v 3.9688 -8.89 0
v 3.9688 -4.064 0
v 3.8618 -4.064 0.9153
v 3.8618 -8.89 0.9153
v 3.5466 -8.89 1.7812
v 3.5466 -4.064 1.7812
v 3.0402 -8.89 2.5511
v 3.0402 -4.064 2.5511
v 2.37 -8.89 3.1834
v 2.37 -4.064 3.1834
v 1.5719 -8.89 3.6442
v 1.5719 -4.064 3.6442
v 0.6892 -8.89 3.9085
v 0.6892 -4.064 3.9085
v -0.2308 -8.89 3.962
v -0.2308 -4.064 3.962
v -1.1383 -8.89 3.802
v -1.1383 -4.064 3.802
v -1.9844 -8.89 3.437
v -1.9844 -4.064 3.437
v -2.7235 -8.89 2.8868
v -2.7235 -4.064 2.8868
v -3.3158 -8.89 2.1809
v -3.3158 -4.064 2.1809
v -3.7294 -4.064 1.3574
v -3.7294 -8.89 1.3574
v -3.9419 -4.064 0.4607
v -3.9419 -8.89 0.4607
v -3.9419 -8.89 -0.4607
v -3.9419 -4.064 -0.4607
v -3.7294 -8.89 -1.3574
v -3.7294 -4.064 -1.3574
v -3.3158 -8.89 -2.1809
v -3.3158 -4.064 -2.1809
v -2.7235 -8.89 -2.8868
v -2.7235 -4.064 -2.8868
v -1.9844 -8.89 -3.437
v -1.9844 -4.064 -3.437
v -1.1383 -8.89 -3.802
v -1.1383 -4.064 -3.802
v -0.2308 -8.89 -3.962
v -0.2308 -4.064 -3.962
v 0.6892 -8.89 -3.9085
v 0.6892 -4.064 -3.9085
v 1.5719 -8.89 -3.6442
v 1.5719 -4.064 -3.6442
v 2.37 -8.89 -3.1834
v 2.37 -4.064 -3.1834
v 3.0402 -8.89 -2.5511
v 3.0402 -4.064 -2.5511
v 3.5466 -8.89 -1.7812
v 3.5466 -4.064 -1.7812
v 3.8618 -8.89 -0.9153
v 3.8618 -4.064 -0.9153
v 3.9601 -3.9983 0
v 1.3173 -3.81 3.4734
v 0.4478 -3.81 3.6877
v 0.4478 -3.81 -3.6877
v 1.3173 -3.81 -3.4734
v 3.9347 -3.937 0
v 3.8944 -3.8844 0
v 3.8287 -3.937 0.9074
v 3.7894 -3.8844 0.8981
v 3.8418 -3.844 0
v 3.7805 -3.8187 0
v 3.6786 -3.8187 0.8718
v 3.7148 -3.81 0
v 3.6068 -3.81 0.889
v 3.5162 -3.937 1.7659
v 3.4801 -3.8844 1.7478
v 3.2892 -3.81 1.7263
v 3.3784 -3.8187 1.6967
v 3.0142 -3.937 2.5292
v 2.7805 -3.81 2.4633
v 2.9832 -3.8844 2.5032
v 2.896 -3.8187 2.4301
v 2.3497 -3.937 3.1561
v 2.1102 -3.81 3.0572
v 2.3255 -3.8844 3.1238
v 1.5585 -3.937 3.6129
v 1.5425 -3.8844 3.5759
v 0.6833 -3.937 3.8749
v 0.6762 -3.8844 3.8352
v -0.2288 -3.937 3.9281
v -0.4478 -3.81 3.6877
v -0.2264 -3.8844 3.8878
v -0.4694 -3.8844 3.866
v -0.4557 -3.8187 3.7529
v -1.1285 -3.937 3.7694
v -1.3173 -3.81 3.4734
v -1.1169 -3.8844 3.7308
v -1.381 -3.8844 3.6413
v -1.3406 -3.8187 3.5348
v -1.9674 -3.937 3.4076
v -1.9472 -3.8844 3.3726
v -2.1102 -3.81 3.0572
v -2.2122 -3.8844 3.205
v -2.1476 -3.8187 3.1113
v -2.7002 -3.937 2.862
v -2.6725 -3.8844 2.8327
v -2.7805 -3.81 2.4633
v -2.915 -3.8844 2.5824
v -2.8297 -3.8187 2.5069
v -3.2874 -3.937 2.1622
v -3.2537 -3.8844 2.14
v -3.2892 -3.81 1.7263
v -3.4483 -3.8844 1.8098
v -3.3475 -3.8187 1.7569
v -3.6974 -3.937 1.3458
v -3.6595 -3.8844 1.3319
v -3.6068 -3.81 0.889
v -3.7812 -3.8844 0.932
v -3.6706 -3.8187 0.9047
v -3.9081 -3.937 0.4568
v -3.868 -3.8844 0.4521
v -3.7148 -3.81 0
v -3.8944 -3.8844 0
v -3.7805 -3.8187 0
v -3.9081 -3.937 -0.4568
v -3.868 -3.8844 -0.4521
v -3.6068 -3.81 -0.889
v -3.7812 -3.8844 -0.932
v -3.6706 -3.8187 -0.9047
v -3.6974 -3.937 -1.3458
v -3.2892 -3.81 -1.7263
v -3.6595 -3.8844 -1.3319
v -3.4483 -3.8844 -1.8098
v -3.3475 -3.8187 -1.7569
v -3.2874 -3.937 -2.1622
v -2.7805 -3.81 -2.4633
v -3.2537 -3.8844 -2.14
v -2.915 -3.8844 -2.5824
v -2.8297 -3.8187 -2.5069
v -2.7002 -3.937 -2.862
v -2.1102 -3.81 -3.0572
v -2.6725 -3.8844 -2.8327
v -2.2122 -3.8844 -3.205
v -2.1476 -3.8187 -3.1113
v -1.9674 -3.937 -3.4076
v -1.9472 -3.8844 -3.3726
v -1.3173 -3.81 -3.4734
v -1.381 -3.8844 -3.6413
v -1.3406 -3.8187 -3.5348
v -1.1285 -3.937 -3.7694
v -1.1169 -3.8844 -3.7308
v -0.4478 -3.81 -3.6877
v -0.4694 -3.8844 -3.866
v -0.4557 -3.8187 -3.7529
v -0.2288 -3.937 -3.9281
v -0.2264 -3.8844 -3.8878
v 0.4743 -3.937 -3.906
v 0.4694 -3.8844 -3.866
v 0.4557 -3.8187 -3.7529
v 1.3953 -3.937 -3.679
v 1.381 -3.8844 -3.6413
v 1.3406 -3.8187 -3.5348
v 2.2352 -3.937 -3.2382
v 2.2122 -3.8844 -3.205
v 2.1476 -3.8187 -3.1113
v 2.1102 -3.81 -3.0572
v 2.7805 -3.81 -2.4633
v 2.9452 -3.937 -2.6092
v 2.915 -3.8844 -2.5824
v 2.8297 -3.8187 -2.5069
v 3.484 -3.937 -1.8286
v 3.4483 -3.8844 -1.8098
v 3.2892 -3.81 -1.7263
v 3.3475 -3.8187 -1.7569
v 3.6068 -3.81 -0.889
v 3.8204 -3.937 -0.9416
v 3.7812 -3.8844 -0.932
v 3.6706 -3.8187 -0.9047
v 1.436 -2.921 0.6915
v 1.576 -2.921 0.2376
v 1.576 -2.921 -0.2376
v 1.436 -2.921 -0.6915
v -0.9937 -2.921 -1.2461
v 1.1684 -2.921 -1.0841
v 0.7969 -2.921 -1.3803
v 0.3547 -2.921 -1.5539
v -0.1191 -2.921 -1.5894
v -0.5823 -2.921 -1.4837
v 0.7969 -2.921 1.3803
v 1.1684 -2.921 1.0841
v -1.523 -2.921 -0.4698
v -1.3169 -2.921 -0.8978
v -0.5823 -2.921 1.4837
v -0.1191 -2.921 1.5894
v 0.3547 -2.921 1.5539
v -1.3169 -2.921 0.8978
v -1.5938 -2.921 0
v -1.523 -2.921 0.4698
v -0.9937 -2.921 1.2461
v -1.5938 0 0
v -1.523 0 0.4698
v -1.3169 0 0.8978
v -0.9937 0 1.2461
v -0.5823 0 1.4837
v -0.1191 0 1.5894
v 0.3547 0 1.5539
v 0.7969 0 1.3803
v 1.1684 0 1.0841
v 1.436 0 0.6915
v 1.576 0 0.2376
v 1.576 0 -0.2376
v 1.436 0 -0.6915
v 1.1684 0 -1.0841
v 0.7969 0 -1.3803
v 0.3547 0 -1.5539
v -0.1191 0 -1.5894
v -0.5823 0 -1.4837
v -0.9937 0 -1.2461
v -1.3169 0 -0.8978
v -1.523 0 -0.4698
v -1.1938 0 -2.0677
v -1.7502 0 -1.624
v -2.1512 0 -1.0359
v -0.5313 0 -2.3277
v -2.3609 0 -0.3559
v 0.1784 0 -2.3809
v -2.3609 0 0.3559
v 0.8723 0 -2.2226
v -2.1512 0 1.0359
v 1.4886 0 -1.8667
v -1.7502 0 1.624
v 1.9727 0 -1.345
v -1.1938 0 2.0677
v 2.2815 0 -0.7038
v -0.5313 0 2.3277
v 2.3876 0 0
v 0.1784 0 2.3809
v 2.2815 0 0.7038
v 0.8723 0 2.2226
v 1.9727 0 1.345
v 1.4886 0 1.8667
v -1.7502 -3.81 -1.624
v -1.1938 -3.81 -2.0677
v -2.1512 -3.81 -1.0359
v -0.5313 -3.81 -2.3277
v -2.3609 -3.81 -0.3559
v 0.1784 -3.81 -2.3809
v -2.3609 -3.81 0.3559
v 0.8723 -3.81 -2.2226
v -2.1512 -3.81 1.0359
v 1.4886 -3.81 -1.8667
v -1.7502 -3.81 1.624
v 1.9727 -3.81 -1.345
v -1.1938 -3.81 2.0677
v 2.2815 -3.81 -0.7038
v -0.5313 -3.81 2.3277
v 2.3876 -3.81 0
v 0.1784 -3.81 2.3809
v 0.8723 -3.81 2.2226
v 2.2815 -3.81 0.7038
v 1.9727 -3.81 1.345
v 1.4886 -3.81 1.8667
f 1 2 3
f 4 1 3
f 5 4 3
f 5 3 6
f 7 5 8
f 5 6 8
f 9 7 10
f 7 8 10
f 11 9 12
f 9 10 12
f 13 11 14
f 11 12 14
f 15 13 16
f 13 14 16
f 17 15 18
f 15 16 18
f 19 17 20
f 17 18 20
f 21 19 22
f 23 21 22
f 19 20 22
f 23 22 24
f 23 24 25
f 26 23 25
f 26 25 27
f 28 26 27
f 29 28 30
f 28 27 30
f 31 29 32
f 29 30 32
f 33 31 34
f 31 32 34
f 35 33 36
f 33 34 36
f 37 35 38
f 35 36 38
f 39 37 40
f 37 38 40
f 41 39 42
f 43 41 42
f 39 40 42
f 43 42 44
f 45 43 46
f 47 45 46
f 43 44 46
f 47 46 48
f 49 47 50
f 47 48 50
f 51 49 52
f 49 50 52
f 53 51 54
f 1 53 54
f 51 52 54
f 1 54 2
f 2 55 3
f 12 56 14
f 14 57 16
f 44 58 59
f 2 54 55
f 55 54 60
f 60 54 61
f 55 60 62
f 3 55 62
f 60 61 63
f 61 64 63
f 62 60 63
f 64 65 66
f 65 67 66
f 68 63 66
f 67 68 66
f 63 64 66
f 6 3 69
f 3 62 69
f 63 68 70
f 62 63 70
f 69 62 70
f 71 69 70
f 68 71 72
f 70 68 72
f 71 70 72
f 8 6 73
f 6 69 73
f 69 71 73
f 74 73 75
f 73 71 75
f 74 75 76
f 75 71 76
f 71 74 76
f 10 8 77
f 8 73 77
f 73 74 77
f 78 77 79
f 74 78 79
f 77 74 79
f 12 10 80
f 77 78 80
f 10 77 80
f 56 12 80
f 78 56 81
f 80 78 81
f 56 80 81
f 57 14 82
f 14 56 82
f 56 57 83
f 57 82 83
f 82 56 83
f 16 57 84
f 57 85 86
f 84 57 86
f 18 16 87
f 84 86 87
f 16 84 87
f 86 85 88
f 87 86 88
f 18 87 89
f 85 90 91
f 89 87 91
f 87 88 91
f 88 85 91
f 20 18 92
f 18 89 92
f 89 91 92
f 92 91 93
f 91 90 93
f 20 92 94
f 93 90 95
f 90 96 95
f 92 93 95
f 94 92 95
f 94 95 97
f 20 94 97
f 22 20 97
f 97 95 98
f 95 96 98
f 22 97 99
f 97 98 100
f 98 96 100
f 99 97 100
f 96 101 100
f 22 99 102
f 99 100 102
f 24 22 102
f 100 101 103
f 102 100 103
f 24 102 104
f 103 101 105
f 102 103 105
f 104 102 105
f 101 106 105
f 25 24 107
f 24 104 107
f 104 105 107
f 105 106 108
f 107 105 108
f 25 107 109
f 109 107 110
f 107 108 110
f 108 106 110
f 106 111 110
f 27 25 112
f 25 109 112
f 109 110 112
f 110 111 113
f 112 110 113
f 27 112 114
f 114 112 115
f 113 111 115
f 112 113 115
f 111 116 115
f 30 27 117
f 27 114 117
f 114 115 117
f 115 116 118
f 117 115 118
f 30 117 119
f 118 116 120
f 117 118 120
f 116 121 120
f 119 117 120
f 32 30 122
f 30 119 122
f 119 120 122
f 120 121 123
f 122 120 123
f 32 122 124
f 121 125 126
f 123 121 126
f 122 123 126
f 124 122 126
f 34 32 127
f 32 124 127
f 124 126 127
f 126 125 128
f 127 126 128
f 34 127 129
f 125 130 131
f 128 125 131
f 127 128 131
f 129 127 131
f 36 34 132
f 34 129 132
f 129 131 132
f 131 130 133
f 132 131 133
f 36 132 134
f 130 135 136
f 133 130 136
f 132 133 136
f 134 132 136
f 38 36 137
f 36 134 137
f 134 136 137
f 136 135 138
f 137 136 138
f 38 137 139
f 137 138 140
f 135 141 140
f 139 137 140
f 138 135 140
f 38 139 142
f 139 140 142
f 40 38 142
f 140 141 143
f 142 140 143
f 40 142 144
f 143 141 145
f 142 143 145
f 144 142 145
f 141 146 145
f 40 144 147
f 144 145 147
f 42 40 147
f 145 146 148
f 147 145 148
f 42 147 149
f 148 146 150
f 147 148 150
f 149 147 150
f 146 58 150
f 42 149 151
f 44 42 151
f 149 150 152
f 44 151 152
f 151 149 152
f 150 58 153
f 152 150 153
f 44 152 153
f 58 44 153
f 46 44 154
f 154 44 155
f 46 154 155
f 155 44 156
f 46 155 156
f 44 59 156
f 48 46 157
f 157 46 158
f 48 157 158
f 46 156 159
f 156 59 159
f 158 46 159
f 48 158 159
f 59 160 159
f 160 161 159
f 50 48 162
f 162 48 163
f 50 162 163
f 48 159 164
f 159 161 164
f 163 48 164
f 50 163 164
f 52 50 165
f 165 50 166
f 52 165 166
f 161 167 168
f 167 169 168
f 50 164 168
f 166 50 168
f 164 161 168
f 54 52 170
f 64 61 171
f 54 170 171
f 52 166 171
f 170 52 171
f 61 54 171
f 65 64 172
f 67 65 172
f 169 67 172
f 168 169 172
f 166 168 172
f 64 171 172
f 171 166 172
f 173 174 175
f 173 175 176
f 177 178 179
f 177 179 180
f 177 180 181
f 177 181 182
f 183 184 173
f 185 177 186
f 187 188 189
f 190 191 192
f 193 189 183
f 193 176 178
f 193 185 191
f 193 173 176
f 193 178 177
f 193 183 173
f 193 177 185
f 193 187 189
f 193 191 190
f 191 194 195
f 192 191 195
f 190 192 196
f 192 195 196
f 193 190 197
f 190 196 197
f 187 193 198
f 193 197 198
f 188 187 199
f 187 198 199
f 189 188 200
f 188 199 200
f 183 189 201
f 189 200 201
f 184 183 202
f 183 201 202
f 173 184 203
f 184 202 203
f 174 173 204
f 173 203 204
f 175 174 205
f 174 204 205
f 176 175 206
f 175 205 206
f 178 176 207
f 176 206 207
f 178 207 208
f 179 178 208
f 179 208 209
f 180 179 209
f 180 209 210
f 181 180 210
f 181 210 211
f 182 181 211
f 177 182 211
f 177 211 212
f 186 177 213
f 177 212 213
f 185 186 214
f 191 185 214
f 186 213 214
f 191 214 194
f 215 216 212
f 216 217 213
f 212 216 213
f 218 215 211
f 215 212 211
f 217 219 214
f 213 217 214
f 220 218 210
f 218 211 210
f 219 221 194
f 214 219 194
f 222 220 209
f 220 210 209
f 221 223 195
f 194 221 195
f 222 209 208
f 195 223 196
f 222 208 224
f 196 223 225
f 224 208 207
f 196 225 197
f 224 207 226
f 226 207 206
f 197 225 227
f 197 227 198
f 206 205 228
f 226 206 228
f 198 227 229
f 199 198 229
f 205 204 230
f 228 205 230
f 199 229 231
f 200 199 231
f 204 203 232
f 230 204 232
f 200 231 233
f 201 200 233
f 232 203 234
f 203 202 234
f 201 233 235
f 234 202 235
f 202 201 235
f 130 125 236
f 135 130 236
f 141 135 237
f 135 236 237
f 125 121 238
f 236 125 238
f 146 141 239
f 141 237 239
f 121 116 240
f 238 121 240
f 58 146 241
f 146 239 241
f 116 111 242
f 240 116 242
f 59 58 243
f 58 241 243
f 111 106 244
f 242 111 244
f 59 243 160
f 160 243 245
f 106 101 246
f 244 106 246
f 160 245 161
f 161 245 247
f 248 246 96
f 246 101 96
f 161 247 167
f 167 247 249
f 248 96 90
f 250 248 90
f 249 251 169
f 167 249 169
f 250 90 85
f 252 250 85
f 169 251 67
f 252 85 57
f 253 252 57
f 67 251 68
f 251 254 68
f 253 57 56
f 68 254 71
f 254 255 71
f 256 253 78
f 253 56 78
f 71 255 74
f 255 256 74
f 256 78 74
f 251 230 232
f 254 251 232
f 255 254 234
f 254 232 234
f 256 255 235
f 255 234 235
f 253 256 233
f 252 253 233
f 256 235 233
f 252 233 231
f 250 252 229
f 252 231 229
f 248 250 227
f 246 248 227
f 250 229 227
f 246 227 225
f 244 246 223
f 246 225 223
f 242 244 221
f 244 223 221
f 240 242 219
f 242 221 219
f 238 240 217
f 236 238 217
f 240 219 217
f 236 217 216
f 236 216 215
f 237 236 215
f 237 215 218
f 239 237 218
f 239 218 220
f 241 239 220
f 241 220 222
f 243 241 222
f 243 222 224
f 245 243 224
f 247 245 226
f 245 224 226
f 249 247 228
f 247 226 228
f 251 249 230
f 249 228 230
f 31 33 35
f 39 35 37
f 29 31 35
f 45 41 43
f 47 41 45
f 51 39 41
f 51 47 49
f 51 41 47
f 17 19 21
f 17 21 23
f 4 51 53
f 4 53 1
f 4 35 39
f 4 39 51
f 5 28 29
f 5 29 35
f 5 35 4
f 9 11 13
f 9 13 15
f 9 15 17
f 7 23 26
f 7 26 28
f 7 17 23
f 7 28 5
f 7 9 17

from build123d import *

# Parameters (mm, degrees)
F0_R     = 2.3876
F1_DEPTH = 3.81
F2_R     = 3.96875
F3_DEPTH = 5.08
F4_R     = 1.59385
F5_DEPTH = 2.921
F6_R     = 0.254


with BuildPart() as f1:
    # F0 (on Front) → F1 (new body)
    with BuildSketch(Plane.XZ):
        Circle(F0_R)
    extrude(amount=F1_DEPTH)

    # F2 (on face) → F3 (join)
    with BuildSketch(Plane.XZ.offset(3.81)):
        Circle(F2_R)
    extrude(amount=F3_DEPTH)

    # F4 (on face) → F5 (cut)
    with BuildSketch(Plane(origin=(0, 0, 0), x_dir=(-1, 0, 0), z_dir=(0, 1, 0))):
        Circle(F4_R)
    extrude(amount=-F5_DEPTH, mode=Mode.SUBTRACT)

    # F6
    f6_edges = [f1.edges().sort_by_distance(p)[0] for p in [
        (-3.96875, -3.81, 0),
    ]]
    fillet(f6_edges, radius=F6_R)


solid = f1.part
